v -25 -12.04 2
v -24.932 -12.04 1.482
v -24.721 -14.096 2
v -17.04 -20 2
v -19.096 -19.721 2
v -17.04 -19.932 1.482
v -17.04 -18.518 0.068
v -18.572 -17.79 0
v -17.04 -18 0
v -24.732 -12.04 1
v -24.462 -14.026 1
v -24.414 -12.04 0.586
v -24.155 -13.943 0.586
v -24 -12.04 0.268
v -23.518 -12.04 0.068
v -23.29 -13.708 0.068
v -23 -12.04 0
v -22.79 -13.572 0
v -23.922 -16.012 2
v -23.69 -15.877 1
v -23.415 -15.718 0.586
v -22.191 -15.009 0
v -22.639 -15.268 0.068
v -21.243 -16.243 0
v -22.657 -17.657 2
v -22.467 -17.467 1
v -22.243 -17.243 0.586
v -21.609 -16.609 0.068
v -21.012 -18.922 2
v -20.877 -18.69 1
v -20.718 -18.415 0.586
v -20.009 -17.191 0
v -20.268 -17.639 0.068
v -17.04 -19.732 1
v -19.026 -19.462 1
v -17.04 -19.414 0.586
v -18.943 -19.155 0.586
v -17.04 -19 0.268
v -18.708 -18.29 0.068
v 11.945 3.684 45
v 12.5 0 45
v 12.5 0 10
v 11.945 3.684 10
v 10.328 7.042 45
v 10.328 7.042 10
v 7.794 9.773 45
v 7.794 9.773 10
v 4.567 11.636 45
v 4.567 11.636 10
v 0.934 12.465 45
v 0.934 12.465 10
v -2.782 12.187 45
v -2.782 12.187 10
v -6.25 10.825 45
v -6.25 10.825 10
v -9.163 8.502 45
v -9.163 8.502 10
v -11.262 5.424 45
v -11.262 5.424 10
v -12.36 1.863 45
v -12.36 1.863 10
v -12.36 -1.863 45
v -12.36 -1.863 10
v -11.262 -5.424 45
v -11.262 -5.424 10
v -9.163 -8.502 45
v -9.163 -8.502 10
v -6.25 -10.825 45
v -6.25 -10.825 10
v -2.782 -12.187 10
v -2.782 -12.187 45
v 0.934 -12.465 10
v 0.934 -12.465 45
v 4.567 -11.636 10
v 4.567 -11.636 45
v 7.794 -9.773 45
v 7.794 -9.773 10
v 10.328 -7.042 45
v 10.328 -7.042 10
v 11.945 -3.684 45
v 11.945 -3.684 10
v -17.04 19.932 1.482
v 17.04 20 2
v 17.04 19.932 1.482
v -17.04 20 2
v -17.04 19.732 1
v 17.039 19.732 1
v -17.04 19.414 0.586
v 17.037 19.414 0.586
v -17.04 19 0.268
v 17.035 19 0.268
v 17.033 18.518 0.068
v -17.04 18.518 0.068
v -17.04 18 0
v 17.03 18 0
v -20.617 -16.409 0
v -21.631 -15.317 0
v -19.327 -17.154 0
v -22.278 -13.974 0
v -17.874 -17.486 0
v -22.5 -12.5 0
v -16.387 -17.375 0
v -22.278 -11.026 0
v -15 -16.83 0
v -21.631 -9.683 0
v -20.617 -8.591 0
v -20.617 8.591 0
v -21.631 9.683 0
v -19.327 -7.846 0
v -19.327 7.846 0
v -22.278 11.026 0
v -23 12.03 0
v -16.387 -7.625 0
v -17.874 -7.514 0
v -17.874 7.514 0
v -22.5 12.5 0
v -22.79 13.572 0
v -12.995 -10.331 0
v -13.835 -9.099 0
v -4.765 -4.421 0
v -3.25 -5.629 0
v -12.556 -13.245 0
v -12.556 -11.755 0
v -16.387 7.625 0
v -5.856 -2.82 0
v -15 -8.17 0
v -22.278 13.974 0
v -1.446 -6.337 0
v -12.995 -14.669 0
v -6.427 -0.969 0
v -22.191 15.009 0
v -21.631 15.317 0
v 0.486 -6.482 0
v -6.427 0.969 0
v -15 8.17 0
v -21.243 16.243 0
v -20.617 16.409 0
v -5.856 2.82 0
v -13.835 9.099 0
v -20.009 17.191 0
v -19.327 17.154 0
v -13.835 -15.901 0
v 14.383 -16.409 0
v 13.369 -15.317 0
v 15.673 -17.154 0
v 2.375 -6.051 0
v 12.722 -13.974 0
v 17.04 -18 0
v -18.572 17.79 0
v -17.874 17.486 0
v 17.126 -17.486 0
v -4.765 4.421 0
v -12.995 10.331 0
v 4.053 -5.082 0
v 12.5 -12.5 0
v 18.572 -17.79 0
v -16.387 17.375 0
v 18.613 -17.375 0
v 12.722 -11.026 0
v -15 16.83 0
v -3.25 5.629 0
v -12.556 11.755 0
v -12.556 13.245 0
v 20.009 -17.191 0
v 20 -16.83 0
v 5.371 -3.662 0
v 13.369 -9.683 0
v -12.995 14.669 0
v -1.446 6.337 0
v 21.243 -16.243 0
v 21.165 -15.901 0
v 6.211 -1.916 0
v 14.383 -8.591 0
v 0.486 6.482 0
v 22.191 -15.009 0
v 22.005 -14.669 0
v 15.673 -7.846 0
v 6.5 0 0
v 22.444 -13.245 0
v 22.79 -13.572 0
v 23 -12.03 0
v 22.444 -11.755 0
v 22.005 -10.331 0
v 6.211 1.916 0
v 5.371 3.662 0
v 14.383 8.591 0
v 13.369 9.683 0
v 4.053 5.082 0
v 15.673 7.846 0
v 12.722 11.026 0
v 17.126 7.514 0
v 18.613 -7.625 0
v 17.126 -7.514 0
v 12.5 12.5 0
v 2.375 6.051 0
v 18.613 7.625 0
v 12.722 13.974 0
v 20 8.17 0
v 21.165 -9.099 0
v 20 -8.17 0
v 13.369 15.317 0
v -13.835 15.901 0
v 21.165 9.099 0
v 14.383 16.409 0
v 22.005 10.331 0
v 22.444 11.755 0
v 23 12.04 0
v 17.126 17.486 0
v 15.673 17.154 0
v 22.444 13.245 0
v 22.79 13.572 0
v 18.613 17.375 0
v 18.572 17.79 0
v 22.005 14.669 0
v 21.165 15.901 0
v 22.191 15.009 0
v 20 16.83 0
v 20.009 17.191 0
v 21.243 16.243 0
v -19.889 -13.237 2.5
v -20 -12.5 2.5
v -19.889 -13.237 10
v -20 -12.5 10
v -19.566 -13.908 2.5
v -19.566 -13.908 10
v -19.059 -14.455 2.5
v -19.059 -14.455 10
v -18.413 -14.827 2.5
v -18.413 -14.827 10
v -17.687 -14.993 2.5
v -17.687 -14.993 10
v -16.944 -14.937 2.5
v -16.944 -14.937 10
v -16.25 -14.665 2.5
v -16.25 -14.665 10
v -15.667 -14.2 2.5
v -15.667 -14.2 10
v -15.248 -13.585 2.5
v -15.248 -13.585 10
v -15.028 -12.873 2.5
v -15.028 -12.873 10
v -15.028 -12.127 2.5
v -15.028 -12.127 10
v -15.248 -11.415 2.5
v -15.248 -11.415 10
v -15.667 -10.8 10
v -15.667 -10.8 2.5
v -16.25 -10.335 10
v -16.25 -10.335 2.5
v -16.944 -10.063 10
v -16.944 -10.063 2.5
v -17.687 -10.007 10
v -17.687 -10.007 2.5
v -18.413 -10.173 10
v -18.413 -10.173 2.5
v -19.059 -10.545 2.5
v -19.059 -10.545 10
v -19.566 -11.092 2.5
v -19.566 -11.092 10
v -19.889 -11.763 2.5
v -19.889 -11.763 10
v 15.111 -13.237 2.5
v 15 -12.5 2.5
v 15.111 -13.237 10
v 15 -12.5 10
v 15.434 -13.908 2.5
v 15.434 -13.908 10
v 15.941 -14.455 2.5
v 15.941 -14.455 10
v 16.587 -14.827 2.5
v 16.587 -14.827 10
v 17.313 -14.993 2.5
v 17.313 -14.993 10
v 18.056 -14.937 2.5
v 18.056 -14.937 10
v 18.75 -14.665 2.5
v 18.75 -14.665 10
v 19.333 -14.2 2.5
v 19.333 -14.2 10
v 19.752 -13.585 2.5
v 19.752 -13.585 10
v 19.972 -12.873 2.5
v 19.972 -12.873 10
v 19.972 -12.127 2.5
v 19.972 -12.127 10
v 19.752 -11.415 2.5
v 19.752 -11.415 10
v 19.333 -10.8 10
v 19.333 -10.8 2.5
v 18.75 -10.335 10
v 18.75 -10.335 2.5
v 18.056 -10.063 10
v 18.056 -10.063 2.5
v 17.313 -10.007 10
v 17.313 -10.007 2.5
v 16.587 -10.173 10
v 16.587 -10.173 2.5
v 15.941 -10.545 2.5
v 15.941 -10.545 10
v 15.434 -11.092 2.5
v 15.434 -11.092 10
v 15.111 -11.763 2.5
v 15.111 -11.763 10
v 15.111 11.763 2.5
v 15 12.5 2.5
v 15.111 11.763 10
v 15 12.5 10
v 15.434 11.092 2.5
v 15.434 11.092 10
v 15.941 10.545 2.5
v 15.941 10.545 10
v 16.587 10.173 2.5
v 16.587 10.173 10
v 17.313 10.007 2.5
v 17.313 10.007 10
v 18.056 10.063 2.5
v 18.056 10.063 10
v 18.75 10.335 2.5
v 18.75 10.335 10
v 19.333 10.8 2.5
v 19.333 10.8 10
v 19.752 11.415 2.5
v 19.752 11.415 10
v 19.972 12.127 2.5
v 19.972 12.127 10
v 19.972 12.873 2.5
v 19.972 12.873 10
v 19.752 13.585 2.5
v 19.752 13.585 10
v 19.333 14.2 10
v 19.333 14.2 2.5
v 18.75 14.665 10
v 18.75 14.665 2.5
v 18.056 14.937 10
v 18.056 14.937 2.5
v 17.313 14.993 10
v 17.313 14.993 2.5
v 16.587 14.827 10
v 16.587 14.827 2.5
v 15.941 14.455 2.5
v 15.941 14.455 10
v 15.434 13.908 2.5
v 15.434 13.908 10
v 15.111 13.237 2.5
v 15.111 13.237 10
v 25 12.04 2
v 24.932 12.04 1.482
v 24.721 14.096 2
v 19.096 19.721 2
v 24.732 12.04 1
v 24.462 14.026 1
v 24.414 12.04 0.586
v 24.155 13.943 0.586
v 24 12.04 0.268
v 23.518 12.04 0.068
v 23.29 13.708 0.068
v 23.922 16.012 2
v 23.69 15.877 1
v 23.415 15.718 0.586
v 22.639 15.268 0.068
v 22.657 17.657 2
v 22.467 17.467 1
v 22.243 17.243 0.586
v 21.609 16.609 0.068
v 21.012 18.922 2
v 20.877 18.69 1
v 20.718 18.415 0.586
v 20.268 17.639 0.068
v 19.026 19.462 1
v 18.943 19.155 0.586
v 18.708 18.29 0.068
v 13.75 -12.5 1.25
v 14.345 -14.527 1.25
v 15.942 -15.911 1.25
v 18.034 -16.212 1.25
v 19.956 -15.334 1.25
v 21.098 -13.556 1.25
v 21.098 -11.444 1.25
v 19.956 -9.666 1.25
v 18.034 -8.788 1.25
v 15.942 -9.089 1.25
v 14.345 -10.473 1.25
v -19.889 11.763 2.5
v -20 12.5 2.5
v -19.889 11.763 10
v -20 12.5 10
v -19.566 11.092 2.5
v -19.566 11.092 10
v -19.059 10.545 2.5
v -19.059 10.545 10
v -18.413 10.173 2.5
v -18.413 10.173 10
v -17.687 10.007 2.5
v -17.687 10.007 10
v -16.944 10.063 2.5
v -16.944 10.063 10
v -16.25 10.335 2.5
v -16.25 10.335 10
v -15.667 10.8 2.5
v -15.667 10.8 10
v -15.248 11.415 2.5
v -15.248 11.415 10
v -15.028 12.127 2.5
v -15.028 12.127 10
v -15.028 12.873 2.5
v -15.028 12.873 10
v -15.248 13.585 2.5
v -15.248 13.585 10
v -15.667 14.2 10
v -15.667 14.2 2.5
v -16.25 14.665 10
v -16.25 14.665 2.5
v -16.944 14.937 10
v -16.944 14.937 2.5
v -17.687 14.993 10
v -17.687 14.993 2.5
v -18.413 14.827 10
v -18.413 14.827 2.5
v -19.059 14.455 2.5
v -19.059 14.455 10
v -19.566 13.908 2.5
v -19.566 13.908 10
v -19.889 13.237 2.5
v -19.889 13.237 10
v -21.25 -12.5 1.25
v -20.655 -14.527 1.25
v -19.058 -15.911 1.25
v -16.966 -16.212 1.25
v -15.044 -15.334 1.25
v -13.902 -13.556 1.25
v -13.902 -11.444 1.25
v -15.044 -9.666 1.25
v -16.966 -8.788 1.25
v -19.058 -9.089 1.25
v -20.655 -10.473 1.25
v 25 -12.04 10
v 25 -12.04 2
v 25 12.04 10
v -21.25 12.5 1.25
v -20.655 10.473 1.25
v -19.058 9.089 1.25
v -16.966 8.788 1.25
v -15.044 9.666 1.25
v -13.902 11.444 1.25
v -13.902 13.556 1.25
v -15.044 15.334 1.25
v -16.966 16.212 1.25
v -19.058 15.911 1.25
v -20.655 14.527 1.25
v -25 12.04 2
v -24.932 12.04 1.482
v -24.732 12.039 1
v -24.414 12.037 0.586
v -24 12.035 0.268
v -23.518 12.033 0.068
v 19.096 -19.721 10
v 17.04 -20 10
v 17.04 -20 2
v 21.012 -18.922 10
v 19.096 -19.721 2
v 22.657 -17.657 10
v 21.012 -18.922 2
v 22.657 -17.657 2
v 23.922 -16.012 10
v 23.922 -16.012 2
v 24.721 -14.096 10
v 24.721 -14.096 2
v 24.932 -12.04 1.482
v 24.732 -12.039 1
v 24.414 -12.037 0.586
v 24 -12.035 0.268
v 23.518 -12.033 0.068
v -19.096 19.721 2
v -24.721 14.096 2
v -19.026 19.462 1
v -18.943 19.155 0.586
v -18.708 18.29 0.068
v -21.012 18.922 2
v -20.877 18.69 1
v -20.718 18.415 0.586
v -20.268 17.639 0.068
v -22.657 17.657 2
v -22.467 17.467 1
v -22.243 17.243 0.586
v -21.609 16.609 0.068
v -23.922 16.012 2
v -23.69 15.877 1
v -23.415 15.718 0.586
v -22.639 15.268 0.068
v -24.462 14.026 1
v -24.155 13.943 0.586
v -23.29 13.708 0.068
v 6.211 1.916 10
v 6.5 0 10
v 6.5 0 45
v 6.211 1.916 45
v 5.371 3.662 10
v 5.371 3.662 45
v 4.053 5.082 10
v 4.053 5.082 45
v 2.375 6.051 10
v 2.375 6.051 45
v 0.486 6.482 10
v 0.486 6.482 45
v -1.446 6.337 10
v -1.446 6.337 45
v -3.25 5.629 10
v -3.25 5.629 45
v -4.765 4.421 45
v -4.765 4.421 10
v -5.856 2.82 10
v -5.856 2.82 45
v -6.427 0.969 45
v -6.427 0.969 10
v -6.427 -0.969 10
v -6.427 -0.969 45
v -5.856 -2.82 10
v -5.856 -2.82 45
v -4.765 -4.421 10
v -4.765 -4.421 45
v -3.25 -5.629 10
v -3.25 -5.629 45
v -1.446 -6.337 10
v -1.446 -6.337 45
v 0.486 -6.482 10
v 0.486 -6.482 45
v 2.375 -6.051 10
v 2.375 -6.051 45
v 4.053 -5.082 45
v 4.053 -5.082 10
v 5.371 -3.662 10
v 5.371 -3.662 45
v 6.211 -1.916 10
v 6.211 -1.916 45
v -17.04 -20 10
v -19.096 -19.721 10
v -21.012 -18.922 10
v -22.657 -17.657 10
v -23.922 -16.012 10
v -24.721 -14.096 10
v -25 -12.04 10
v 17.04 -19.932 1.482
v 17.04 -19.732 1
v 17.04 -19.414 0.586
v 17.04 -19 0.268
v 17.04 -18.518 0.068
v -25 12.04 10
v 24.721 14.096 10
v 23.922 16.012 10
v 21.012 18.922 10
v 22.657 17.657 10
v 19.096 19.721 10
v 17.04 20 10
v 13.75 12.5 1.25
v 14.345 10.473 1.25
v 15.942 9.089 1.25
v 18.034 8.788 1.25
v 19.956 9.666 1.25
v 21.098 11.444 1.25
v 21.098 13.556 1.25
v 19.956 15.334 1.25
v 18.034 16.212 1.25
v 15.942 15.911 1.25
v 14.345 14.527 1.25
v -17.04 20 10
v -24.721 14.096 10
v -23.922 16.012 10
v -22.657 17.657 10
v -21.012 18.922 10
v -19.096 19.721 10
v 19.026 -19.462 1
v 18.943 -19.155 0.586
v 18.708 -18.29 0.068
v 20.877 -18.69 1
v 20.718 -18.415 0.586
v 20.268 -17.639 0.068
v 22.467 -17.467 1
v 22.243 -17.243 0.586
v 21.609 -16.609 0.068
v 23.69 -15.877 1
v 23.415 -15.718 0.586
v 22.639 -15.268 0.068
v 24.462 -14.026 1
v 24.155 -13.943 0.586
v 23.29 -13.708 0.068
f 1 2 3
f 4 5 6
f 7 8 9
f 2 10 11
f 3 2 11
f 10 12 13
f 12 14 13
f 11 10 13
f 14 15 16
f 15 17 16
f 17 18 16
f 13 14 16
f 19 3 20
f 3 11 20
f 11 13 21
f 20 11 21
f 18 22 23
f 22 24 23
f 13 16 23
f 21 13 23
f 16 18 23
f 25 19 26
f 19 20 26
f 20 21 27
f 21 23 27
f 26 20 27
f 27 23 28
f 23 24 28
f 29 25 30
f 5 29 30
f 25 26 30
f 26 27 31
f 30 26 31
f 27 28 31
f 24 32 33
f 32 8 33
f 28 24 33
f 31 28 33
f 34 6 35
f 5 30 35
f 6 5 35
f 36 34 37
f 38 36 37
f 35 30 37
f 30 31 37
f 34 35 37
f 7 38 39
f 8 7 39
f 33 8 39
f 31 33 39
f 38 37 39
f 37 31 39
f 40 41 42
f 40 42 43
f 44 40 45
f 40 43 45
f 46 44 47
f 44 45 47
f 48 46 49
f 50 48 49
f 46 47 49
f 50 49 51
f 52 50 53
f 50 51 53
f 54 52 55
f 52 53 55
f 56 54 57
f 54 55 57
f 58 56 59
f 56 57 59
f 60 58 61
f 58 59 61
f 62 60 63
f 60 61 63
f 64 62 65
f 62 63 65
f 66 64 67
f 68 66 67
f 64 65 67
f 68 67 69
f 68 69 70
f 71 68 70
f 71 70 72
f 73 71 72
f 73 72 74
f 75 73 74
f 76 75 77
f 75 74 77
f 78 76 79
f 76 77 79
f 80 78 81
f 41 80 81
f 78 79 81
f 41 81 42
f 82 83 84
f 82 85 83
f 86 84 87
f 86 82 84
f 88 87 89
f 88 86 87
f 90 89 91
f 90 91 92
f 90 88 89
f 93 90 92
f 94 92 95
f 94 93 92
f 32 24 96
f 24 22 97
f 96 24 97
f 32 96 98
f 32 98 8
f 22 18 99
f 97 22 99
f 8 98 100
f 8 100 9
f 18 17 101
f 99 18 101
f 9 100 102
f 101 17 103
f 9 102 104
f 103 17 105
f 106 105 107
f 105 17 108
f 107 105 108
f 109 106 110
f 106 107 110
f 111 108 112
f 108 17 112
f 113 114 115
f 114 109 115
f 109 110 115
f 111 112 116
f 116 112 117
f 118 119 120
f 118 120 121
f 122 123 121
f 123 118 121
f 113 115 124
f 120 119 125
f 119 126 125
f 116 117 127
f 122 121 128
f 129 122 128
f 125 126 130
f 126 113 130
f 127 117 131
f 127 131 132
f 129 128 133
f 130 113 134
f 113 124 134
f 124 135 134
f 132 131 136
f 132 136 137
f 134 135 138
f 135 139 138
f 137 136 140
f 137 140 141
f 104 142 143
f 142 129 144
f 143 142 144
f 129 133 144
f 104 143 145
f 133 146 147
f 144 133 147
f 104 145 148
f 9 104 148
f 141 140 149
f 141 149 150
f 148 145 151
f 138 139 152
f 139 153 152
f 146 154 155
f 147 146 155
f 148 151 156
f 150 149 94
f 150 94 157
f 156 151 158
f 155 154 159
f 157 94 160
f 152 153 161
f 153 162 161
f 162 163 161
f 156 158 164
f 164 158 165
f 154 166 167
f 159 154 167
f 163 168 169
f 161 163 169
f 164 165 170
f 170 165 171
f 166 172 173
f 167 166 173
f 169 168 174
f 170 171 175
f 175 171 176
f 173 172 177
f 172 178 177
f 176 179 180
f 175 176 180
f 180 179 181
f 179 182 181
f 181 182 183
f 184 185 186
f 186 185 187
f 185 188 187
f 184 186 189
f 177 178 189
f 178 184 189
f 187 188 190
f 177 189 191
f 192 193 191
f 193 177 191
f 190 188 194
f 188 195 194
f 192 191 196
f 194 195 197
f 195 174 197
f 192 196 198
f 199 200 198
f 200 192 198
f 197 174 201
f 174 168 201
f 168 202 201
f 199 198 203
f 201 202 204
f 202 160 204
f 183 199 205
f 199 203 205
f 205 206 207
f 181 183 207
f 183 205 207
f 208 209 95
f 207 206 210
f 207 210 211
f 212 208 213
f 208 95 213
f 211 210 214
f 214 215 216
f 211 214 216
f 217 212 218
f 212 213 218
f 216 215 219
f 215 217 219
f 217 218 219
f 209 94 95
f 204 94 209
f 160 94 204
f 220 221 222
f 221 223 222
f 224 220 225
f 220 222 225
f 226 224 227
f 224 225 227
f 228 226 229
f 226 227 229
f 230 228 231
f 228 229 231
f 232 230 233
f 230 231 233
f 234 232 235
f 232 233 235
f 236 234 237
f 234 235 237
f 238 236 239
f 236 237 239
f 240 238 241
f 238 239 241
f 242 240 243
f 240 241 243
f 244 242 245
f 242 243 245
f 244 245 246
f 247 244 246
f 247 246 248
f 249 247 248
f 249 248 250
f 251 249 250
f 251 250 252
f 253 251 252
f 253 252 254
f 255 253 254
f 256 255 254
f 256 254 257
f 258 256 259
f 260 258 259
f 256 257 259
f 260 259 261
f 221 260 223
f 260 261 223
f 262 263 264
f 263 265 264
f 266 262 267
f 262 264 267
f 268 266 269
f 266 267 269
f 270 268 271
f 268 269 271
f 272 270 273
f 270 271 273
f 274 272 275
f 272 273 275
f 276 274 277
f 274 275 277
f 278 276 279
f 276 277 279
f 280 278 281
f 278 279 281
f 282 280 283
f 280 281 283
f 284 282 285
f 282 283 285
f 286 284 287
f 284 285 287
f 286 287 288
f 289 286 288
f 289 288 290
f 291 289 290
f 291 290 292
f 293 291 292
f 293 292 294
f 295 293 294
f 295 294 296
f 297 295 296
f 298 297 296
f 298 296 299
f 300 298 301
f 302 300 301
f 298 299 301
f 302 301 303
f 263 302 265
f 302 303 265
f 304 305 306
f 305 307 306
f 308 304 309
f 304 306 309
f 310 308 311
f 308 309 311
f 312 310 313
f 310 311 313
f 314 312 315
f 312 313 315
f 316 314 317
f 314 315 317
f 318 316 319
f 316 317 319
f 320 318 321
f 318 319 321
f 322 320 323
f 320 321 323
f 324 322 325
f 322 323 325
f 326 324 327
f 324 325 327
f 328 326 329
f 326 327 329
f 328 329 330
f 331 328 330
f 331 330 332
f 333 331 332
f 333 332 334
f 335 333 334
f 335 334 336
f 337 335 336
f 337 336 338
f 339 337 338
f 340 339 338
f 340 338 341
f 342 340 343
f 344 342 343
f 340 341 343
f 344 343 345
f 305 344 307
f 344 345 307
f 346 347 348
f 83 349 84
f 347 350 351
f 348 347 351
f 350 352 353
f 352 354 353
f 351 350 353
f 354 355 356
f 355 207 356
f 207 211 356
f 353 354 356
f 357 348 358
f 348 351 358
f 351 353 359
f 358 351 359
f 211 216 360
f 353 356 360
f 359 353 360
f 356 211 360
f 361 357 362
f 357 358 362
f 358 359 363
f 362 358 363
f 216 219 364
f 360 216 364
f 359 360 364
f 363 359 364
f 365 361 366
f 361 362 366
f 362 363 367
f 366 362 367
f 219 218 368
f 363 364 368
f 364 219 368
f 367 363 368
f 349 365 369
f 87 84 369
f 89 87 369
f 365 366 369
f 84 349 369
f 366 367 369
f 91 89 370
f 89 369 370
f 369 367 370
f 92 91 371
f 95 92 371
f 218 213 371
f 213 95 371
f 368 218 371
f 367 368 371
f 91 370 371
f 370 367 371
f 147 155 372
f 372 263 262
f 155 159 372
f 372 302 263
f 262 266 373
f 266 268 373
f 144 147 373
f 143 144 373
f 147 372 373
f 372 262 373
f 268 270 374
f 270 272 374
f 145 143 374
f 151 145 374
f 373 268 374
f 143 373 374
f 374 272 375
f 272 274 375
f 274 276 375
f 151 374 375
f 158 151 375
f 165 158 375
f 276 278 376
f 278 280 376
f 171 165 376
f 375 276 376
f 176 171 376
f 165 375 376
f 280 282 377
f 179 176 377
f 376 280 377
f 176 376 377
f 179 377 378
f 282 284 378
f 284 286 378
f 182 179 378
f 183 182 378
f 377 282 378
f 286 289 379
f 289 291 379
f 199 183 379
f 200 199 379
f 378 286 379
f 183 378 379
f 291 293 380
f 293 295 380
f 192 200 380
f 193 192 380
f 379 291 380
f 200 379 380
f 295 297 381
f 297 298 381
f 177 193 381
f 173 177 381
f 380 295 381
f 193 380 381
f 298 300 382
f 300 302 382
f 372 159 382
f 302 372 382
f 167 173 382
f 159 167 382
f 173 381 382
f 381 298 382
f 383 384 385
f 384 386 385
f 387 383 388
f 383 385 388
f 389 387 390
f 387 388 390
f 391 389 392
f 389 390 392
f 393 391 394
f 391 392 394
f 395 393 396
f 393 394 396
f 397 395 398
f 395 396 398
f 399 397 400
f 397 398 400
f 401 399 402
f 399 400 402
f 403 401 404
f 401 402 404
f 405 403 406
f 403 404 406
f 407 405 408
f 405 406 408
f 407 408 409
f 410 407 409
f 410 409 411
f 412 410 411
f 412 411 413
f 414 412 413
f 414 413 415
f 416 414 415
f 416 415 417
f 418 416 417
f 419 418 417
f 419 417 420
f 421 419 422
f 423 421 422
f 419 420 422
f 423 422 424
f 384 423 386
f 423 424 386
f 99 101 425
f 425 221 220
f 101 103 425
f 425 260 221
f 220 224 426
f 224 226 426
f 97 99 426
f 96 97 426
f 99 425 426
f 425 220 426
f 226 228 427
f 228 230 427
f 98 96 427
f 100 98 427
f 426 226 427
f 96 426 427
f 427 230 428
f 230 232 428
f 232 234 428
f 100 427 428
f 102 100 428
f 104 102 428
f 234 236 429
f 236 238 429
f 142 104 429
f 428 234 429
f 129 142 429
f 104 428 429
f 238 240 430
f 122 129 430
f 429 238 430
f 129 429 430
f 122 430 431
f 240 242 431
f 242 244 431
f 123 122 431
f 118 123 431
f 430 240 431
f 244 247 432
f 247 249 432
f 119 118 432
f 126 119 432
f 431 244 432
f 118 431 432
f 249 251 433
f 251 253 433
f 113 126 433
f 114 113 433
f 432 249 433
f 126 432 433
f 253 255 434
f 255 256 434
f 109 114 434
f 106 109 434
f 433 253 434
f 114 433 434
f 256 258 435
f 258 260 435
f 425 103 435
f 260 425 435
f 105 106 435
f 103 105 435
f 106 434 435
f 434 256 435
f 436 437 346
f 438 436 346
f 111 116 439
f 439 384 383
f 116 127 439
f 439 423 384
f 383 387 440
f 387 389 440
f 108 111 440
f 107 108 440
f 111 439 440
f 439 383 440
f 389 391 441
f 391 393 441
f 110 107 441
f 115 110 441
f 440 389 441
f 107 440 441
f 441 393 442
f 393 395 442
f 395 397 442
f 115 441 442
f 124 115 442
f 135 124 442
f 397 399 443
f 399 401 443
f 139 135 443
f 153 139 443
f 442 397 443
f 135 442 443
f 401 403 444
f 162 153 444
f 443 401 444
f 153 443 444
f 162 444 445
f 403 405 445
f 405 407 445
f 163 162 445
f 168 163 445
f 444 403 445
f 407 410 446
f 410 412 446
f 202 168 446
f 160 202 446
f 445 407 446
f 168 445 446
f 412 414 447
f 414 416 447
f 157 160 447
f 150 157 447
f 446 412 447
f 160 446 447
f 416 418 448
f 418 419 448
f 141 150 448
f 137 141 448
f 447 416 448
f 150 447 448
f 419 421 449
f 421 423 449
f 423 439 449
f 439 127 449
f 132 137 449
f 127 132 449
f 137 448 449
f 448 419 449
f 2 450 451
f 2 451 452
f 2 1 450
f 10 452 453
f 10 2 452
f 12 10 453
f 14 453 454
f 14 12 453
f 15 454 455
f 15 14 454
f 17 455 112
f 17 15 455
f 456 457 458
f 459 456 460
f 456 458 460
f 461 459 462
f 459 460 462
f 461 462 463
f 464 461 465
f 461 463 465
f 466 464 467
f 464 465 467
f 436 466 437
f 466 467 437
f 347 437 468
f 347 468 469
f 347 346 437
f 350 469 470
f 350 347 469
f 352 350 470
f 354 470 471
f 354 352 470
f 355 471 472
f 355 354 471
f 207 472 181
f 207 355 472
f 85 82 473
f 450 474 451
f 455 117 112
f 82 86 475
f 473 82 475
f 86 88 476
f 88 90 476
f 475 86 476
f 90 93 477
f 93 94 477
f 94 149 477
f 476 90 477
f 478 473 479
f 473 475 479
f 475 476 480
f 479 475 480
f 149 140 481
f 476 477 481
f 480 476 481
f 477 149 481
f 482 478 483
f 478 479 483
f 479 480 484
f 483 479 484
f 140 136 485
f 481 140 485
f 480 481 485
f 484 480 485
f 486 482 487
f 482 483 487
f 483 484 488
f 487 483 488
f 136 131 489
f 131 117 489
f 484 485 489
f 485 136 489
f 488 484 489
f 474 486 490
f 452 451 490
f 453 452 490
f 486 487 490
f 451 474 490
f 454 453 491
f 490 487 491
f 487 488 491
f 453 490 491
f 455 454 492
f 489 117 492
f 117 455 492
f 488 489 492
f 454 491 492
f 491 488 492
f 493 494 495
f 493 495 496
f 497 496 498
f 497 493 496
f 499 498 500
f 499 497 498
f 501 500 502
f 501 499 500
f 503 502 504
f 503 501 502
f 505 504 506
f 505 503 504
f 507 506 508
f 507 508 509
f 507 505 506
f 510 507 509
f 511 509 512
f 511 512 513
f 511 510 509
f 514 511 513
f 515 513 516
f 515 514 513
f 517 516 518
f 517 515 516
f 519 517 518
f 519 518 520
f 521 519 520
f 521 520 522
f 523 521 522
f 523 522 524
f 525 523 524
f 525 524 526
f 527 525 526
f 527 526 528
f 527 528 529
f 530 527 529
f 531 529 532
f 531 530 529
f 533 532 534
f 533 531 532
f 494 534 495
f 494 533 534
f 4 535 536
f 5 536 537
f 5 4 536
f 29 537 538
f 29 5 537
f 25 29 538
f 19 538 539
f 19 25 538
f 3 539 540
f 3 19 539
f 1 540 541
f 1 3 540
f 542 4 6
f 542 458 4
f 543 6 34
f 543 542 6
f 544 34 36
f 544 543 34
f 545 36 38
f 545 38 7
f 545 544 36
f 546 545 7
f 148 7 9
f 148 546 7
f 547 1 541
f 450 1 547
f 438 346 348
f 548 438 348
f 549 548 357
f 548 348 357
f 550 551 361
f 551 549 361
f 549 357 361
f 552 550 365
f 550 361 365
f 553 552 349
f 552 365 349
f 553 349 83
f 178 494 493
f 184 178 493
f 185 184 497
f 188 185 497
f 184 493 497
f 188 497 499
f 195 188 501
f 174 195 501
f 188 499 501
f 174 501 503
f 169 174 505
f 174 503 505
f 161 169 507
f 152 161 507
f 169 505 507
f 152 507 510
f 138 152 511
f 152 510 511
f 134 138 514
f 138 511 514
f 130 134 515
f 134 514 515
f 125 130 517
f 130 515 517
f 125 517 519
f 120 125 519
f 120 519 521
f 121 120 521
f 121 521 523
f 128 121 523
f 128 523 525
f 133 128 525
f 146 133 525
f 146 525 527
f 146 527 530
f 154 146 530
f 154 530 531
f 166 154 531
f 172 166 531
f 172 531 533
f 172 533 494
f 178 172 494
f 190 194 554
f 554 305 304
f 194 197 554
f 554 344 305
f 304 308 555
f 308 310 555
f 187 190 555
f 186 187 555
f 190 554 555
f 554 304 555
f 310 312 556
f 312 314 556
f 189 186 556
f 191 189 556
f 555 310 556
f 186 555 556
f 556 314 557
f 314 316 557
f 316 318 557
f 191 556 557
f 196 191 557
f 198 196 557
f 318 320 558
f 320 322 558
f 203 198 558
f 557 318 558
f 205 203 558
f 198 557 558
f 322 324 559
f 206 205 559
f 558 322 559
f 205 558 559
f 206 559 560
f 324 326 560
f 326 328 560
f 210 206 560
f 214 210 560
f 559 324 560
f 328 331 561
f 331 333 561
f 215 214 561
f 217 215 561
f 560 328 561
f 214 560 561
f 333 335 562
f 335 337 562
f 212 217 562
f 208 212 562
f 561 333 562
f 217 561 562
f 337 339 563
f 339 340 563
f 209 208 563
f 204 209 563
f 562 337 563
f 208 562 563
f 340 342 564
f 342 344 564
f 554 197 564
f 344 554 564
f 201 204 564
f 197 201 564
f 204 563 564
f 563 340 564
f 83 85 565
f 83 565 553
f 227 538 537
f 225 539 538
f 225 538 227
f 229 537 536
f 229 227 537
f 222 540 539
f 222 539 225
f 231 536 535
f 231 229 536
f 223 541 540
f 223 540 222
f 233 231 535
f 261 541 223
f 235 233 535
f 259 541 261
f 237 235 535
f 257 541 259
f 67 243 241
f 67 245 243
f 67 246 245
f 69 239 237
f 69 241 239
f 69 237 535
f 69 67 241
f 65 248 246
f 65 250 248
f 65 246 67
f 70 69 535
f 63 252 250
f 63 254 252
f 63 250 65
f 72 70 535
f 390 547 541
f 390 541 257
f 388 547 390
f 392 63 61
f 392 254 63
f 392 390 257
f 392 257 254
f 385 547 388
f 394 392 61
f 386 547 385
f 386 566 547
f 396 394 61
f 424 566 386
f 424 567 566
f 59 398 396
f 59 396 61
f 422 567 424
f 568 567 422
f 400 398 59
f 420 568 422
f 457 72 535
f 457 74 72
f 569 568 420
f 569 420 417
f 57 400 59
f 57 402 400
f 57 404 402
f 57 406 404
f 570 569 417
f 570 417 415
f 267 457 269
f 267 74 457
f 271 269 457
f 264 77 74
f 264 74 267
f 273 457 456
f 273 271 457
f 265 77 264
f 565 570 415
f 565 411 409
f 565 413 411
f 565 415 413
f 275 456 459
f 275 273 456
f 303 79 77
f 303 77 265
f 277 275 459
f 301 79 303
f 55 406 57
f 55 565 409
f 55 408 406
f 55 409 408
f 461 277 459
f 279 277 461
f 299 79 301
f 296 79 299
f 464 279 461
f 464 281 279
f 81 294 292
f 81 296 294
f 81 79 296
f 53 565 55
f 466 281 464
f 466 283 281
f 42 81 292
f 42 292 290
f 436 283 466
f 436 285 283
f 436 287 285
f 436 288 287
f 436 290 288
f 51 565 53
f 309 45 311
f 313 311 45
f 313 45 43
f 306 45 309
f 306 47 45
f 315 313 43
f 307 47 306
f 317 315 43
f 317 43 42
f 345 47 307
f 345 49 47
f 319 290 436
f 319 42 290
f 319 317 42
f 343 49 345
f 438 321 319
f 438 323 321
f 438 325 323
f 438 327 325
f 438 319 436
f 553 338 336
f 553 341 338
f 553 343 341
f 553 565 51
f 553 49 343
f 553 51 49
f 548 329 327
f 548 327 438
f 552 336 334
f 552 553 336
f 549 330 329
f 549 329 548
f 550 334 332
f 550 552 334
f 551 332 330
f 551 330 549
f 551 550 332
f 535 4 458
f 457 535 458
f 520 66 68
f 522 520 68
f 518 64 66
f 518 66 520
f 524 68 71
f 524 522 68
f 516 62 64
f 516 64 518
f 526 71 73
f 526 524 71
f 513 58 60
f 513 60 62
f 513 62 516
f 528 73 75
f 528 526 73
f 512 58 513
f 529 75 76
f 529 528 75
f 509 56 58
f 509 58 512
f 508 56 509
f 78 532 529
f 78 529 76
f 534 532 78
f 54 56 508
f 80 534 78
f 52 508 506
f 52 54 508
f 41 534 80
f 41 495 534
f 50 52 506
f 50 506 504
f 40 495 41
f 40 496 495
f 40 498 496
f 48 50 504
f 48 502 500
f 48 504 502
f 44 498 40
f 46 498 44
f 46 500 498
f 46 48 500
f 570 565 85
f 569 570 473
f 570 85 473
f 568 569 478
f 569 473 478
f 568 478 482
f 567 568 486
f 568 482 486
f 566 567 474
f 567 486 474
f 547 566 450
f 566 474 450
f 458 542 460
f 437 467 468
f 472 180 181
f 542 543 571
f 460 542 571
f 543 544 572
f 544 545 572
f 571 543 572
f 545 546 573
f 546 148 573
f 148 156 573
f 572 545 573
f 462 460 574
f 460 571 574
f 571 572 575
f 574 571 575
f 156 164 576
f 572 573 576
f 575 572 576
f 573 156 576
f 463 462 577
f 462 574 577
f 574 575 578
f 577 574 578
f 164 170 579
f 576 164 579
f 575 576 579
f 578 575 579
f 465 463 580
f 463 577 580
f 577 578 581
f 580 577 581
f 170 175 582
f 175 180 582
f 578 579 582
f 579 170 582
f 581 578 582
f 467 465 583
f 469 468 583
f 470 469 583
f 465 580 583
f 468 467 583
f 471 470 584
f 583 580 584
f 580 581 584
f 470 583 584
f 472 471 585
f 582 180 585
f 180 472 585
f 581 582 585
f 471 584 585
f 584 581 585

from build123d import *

# Parameters (mm, degrees)
F1_W           = 50
F1_H           = 40
F2_DEPTH       = 10
F3_T1_DEPTH    = 49.9995000031
F6_D           = 5
F6_DEPTH       = 20
F6_CSINK_D     = 10
F6_CSINK_ANGLE = 90
F6_TIP         = 1.5021515476
F7_R           = 2
F8_R           = 12.5
F8_R_2         = 6.5
F9_DEPTH       = 35
F10_DEPTH      = 25


# Not quite as in the source:
# - a fillet or chamfer that OpenCascade refuses, or shapes differently, is made with other operations: its cross-section is extruded or revolved along the edge and cut away or added


with BuildPart() as f2:
    # F1 (on Top) → F2 (new body)
    with BuildSketch(Plane.XY):
        Rectangle(F1_W, F1_H)
    extrude(amount=F2_DEPTH)

    # F3: fillet of radius 8 on 4 edges, made by hand

    # F3_s2 → F3_t1 (cut)
    with BuildSketch(Plane.XY.offset(-19.9997500016)):
        with BuildLine():
            ThreePointArc((-17.0001, 20.0001), (-22.6569542495, 17.6569542495), (-25.0001, 12.0001))
            Line((-25.0001, 12.0001), (-25.1601, 12.0001))
            ThreePointArc((-25.1601, 12.0001), (-25.16, 16.00005), (-25.16, 20))
            Line((-25.16, 20), (-25, 20.16))
            ThreePointArc((-25, 20.16), (-21.00005, 20.16), (-17.0001, 20.1601))
            Line((-17.0001, 20.1601), (-17.0001, 20.0001))
        make_face()
        with BuildLine():
            ThreePointArc((25.0001, 12.0001), (22.6569542495, 17.6569542495), (17.0001, 20.0001))
            Line((17.0001, 20.0001), (17.0001, 20.1601))
            ThreePointArc((17.0001, 20.1601), (21.00005, 20.16), (25, 20.16))
            Line((25, 20.16), (25.16, 20))
            ThreePointArc((25.16, 20), (25.16, 16.00005), (25.1601, 12.0001))
            Line((25.1601, 12.0001), (25.0001, 12.0001))
        make_face()
        with BuildLine():
            ThreePointArc((17.0001, -20.0001), (22.6569542495, -17.6569542495), (25.0001, -12.0001))
            Line((25.0001, -12.0001), (25.1601, -12.0001))
            ThreePointArc((25.1601, -12.0001), (25.16, -16.00005), (25.16, -20))
            Line((25.16, -20), (25, -20.16))
            ThreePointArc((25, -20.16), (21.00005, -20.16), (17.0001, -20.1601))
            Line((17.0001, -20.1601), (17.0001, -20.0001))
        make_face()
        with BuildLine():
            ThreePointArc((-17.0001, -20.0001), (-22.6569542495, -17.6569542495), (-25.0001, -12.0001))
            Line((-25.0001, -12.0001), (-25.1601, -12.0001))
            ThreePointArc((-25.1601, -12.0001), (-25.16, -16.00005), (-25.16, -20))
            Line((-25.16, -20), (-25, -20.16))
            ThreePointArc((-25, -20.16), (-21.00005, -20.16), (-17.0001, -20.1601))
            Line((-17.0001, -20.1601), (-17.0001, -20.0001))
        make_face()
    extrude(amount=F3_T1_DEPTH, mode=Mode.SUBTRACT)

    # F6
    with Locations(Plane(origin=(0, 0, 0), x_dir=(1, 0, 0), z_dir=(0, 0, -1))):
        with Locations((17.5, 12.5), (-17.5, 12.5), (-17.5, -12.5), (17.5, -12.5)):
            CounterSinkHole(F6_D / 2, F6_CSINK_D / 2, depth=F6_DEPTH, counter_sink_angle=F6_CSINK_ANGLE)
            with Locations((0, 0, -(F6_DEPTH + F6_TIP / 2))):  # 118° drill point
                Cone(0, F6_D / 2, F6_TIP, mode=Mode.SUBTRACT)

    # F7
    f7_edges = [f2.edges().sort_by_distance(p)[0] for p in [
        (0, -20, 0),
        (-22.656954, -17.656954, 0),
        (-25, 0, 0),
        (22.656954, -17.656954, 0),
        (-22.656954, 17.656954, 0),
        (25, 0, 0),
        (0, 20, 0),
        (22.656954, 17.656954, 0),
    ]]
    fillet(f7_edges, radius=F7_R)

    # F8 (on face) → F9 (join)
    with BuildSketch(Plane.XY.offset(10)):
        Circle(F8_R)
        Circle(F8_R_2, mode=Mode.SUBTRACT)
    extrude(amount=F9_DEPTH)

    # F10 (cut): a face of the model
    f10_faces = [f2.faces().sort_by_distance(p)[0] for p in [
        (0, 0, 10),
    ]]
    extrude(f10_faces, amount=-F10_DEPTH, mode=Mode.SUBTRACT)


solid = f2.part
